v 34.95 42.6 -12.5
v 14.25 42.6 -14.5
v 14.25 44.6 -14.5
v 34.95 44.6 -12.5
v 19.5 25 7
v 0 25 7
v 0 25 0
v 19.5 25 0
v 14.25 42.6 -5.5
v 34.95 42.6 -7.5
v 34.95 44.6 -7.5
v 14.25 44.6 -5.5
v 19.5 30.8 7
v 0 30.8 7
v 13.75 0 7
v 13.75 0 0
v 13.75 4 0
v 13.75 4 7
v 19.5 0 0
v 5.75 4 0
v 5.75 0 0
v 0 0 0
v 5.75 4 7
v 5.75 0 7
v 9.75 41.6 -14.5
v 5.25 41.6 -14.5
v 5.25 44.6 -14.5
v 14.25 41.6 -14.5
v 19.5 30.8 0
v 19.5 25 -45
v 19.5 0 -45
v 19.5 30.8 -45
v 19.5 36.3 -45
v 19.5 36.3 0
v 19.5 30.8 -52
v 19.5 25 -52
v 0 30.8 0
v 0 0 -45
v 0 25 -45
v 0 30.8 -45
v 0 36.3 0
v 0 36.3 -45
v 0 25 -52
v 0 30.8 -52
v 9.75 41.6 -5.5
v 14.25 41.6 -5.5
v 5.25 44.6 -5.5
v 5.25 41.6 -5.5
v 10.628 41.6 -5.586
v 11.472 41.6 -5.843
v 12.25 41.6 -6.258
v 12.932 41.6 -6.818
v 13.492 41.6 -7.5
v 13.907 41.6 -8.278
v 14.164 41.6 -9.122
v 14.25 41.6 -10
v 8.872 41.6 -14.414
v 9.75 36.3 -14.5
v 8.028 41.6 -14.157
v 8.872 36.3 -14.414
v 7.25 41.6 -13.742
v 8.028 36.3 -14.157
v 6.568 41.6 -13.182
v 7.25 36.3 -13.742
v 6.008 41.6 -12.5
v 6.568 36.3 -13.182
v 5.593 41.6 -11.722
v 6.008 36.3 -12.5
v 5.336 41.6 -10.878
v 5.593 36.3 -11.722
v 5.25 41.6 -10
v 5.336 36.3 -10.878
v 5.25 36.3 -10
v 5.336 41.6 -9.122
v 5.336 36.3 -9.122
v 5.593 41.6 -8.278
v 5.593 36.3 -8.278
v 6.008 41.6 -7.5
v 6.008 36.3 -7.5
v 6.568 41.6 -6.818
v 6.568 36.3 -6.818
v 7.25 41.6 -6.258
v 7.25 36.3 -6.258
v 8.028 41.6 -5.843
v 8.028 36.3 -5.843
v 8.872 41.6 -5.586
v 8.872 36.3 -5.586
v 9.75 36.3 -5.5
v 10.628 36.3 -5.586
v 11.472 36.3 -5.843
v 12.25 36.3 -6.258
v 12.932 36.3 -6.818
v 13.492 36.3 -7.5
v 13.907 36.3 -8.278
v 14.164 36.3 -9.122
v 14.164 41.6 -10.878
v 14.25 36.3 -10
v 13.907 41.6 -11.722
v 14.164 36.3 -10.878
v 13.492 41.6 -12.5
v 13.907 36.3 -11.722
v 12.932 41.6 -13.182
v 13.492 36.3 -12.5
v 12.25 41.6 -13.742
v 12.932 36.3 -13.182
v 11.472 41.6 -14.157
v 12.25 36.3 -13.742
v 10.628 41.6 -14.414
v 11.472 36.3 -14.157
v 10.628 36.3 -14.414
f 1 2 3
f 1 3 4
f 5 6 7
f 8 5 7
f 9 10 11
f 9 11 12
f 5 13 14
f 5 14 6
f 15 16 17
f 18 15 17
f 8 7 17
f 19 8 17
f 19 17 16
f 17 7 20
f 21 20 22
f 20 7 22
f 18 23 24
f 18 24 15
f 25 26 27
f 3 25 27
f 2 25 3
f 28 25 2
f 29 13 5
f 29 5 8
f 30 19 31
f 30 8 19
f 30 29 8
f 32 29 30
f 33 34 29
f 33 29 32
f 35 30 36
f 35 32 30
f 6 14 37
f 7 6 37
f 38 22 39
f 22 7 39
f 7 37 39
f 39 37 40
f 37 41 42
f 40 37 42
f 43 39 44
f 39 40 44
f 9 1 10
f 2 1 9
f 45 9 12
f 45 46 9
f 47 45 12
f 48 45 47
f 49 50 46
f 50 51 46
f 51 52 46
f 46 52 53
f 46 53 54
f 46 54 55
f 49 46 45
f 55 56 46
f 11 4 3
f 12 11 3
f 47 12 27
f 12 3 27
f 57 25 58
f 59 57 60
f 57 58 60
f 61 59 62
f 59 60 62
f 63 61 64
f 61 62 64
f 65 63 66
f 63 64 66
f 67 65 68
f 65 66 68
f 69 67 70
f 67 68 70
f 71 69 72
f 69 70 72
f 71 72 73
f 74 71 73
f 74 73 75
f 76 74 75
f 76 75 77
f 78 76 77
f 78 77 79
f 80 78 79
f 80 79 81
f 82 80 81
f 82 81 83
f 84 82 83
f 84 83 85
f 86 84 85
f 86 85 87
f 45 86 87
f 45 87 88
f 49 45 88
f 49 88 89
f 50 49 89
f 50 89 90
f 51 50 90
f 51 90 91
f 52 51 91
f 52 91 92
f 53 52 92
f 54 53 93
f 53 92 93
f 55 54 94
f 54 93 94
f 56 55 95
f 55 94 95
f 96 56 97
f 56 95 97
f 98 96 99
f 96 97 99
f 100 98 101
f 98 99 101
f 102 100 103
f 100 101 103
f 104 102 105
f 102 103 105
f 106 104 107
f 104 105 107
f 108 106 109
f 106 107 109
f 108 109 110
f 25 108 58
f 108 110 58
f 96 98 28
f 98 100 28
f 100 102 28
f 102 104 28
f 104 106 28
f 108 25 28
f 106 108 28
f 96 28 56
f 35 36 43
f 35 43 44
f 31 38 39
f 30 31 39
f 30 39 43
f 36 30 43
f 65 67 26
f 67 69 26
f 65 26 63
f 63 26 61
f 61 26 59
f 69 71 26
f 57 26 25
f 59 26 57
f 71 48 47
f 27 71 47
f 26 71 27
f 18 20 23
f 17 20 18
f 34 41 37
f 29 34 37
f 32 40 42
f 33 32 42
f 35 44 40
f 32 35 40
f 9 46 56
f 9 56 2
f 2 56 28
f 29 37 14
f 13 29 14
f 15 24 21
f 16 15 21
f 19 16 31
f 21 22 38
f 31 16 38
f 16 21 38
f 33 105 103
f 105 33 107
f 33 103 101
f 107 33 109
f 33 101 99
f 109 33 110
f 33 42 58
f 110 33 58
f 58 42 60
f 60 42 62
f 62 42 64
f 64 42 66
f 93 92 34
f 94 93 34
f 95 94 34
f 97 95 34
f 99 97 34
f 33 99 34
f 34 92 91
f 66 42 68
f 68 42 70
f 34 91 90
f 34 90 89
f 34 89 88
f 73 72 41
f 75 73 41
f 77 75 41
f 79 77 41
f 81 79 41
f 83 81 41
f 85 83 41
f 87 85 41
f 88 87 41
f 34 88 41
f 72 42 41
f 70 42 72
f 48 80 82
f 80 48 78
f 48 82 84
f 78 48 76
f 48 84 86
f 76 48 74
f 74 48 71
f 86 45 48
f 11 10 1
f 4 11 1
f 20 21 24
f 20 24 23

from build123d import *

# Parameters (mm, degrees)
BOSS_EXTRUDE1_DEPTH = 19.5
SKETCH2_W           = 8
SKETCH2_H           = 4
BOSS_EXTRUDE2_DEPTH = 7
SKETCH3_R           = 4.5
BOSS_EXTRUDE3_DEPTH = 5.3
SKETCH4_W           = 9
SKETCH4_H           = 9
BOSS_EXTRUDE4_DEPTH = 1
BOSS_EXTRUDE5_DEPTH = 2


with BuildPart() as part:
    # Sketch1 → Boss-Extrude1 (new body)
    with BuildSketch(Plane(origin=(0, 0, 0), x_dir=(0, 0, -1), z_dir=(1, 0, 0))):
        Polygon((0, 0), (45, 0), (45, 25), (52, 25), (52, 30.8), (45, 30.8), (45, 36.3), (0, 36.3), (0, 30.8), (-7, 30.8), (-7, 25), (0, 25), align=None)
    extrude(amount=BOSS_EXTRUDE1_DEPTH)

    # Sketch2 → Boss-Extrude2 (add)
    with BuildSketch(Plane.XY):
        with Locations((9.75, 2)):
            Rectangle(SKETCH2_W, SKETCH2_H)
    extrude(amount=BOSS_EXTRUDE2_DEPTH)

    # Sketch3 → Boss-Extrude3 (add)
    with BuildSketch(Plane(origin=(0, 36.3, 0), x_dir=(1, 0, 0), z_dir=(0, 1, 0))):
        with Locations(Location((9.75, 10, 0), (0, 0, 90))):
            Circle(SKETCH3_R)
    extrude(amount=BOSS_EXTRUDE3_DEPTH)

    # Sketch4 → Boss-Extrude4 (add)
    with BuildSketch(Plane(origin=(0, 41.6, 0), x_dir=(1, 0, 0), z_dir=(0, 1, 0))):
        with Locations((9.75, 10)):
            Rectangle(SKETCH4_W, SKETCH4_H)
    extrude(amount=BOSS_EXTRUDE4_DEPTH)

    # Sketch5 → Boss-Extrude5 (add)
    with BuildSketch(Plane(origin=(0, 42.6, 0), x_dir=(1, 0, 0), z_dir=(0, 1, 0))):
        Polygon((5.25, 14.5), (14.25, 14.5), (34.95, 12.5), (34.95, 10), (34.95, 7.5), (14.25, 5.5), (5.25, 5.5), align=None)
    extrude(amount=BOSS_EXTRUDE5_DEPTH)


solid = part.part
